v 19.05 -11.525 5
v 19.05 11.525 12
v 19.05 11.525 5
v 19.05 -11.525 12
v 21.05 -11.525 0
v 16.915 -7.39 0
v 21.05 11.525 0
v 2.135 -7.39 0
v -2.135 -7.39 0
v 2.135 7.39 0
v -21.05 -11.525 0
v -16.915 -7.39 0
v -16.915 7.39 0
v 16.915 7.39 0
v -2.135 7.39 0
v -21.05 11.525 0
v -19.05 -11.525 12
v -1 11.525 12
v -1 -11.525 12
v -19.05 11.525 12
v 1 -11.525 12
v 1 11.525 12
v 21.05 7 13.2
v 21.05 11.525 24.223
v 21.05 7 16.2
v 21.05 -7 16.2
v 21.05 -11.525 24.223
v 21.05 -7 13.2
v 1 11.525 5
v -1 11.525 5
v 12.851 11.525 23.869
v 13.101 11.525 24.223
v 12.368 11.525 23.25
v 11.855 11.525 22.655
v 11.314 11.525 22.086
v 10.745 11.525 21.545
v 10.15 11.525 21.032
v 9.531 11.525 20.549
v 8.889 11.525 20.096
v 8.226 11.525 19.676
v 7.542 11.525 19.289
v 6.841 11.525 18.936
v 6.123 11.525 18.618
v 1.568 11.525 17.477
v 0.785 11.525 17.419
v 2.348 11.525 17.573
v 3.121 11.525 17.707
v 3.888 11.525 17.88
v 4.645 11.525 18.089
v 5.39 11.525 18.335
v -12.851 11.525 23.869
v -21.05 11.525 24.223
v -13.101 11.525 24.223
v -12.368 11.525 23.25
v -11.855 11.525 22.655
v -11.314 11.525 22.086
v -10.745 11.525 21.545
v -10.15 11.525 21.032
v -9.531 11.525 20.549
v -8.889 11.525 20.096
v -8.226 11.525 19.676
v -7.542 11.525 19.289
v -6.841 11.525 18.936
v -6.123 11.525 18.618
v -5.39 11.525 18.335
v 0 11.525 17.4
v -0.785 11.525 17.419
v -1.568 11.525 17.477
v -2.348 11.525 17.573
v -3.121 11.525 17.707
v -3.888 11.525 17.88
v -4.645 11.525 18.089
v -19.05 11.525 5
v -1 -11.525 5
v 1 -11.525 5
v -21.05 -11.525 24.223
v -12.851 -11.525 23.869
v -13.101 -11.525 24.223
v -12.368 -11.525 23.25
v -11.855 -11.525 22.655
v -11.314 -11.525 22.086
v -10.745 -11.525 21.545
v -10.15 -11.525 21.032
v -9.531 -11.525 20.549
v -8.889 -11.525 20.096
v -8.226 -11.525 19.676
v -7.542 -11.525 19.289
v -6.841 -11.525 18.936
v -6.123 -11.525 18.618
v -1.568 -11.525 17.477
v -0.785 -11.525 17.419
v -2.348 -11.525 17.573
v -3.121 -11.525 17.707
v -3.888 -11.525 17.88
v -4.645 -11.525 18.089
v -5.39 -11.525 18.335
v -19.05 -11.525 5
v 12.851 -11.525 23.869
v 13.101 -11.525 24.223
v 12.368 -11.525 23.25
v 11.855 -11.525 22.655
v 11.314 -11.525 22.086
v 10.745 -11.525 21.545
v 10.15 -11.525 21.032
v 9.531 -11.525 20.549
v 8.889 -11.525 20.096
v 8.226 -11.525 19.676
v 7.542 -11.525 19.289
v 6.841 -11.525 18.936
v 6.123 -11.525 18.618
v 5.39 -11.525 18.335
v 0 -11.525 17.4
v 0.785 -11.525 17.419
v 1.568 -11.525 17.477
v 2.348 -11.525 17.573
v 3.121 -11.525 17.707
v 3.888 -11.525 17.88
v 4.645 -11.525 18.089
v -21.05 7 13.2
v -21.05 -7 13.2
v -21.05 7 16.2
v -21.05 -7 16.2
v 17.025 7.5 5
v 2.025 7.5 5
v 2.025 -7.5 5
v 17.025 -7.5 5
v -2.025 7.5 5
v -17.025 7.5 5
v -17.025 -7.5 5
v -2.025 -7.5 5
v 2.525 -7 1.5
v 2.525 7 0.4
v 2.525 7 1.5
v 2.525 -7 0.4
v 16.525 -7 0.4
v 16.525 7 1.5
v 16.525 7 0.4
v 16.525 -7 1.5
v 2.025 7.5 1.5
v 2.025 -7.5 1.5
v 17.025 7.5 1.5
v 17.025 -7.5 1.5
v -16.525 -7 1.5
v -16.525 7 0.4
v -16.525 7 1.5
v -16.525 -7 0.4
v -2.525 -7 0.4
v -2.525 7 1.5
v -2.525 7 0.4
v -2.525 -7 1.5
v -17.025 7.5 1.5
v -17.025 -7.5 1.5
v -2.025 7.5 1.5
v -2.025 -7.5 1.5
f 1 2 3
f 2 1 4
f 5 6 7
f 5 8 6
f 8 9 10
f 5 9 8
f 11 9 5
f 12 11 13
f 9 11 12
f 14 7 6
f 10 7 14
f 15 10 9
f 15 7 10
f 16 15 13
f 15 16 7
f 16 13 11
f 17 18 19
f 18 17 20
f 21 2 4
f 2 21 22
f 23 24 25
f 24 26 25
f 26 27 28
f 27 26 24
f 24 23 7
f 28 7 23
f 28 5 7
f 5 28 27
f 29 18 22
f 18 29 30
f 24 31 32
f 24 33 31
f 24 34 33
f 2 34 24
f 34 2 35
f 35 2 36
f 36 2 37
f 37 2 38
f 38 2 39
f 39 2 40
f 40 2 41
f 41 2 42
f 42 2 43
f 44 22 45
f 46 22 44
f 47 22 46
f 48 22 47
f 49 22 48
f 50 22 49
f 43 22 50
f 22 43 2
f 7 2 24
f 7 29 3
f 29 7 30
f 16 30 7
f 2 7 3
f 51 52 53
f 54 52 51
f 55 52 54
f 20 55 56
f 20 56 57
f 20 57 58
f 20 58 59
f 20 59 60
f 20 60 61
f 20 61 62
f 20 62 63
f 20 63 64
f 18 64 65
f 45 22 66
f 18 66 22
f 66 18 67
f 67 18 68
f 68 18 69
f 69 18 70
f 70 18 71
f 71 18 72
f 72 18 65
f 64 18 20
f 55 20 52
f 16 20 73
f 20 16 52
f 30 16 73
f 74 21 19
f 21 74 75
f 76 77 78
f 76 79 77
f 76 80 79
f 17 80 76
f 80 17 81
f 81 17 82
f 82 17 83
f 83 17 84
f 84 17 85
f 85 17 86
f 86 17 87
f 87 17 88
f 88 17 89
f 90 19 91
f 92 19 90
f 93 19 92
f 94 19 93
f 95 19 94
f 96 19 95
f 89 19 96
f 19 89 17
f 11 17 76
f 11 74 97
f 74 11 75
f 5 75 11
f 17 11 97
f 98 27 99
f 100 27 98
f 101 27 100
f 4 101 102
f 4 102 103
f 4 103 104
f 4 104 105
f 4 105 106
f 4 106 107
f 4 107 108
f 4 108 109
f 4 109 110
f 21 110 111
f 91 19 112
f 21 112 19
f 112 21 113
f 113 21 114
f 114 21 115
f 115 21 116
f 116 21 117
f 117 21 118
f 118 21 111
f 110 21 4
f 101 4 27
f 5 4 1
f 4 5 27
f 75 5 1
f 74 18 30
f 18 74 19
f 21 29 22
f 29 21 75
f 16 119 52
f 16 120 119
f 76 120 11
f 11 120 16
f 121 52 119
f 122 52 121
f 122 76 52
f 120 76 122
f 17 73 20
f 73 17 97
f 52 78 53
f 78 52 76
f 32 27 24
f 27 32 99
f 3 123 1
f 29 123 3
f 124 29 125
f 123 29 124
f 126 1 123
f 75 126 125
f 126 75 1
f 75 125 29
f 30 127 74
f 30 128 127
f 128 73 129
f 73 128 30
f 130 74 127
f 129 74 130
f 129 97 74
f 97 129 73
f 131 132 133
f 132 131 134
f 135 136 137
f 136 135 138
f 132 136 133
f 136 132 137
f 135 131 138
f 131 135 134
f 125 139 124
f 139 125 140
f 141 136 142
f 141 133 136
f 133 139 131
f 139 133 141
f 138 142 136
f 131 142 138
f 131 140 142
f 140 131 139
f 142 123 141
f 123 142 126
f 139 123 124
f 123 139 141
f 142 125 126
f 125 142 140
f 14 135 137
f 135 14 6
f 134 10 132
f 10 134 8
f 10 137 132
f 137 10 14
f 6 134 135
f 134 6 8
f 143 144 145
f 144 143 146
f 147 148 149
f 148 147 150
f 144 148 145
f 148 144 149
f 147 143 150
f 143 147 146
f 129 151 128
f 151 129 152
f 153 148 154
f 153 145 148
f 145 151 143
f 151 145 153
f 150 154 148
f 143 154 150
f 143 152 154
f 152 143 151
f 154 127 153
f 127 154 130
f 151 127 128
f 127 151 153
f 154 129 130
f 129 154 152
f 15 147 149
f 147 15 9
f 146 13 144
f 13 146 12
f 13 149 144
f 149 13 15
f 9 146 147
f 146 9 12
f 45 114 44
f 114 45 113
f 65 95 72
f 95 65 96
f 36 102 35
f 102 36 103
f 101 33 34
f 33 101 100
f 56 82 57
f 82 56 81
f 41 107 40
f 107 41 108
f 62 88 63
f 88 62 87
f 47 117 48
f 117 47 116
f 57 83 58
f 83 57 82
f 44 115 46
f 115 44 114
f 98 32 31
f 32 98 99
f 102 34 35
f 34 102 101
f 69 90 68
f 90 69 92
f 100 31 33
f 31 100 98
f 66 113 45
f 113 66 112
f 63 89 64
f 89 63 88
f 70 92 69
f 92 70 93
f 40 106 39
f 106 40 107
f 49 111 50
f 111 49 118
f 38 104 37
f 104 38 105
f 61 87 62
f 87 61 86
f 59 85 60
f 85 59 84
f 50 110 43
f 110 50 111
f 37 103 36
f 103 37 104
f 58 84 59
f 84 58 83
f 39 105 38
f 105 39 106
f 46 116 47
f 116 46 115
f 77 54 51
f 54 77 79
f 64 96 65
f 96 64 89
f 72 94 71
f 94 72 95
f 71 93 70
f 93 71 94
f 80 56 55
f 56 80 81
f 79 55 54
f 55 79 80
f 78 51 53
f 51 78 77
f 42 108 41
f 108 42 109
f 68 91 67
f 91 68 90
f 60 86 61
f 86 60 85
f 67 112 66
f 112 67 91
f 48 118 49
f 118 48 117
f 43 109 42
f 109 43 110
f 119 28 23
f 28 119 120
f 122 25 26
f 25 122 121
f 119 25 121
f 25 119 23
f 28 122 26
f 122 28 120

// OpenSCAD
// file: params.scad
// Every part includes this file, so a fit measured on a test print changes in
// one place. All lengths in mm.

// Snap clip around an aerobar extension. The bore and the 30 mm block across
// the tube are the Onshape V8 crossbar's, which clips onto the Profile Design
// Airstryke extensions.
tube_bore = 22.3;
clip_width = 30;
// Solid between the top of the bore and the clip's closed face.
clip_floor = 6;
// The tightest of the fit test's 20.6, 21.0 and 21.4, and the best grip in PLA
// on a 10 mm slice. A full-length clip grips harder.
clip_mouth = 20.6;
// Over the tape where the bar pod sits: a paper strip's wrap length / pi.
bar_diameter = 32;

key_pitch = 19.05;

// Every fit-test cutout from 13.9 to 14.1 held a switch, so the middle one
// leaves margin either way.
switch_cutout = 14.0;
// MX switch clips latch under a lip this thick, and need a wider pocket below
// it to spring back out into.
switch_plate = 1.5;
switch_relief = 15.0;

m3_clearance = 3.4;
// Nominal M3 nuts are 2.4 thick and 5.5 across the flats.
m3_nut_depth = 2.6;
// main file
// Two keys stacked across the base bar, facing forward. A strap holds a saddle
// cut to the taped bar against its front.
include <params.scad>

// From the plate top: 5 of switch housing and 3.3 of pins, then room to solder
// a wire on and bend it out through either open end of the bay.
switch_depth = 12;
plate_thickness = 5;
wall = 2;
// The cap face prints on the bed, and the chamfer keeps first-layer squish out
// of the cutout.
chamfer = 0.4;
// Width along the bar and thickness: a 1/2" velcro strap, or two zip ties up
// to 4.8 mm wide side by side.
strap = [14, 3];
skin = 1.2;
// Degrees either side of the bar's front that the saddle wraps.
wrap = 55;

r = bar_diameter / 2;
width = 2 * key_pitch + 2 * wall;
depth = key_pitch + 2 * wall;
back = r * cos(wrap);
floor_top = r + skin + strap[1] + skin;
plate_top = floor_top + switch_depth;

$fn = 128;

module switch_hole() {
    base = plate_top - plate_thickness;
    translate([-switch_cutout / 2, -switch_cutout / 2, base - 1])
        cube([switch_cutout, switch_cutout, plate_thickness + 2]);
    translate([-switch_relief / 2, -switch_relief / 2, base - 1])
        cube([switch_relief, switch_relief, plate_thickness - switch_plate + 1]);
    translate([0, 0, plate_top - chamfer])
        linear_extrude(chamfer + 0.01, scale = (switch_cutout + 2 * chamfer) / switch_cutout)
            square(switch_cutout, center = true);
}

// Modeled as mounted: the bar's center on the origin, running along y, keys
// facing forward along +z.
module pod() {
    difference() {
        union() {
            translate([-width / 2, -depth / 2, back])
                cube([width, depth, floor_top - back]);
            // Two outer walls and a rib between the switches.
            for (x = [-width / 2, -wall / 2, width / 2 - wall])
                translate([x, -depth / 2, floor_top]) cube([wall, depth, switch_depth]);
            translate([-width / 2, -depth / 2, plate_top - plate_thickness])
                cube([width, depth, plate_thickness]);
        }
        rotate([90, 0, 0]) cylinder(r = r, h = depth + 2, center = true);
        translate([-width / 2 - 1, -strap[0] / 2, r + skin])
            cube([width + 2, strap[0], strap[1]]);
        for (x = [-key_pitch / 2, key_pitch / 2])
            translate([x, 0, 0]) switch_hole();
    }
}

// Upside down to print: cap face on the bed, saddle up.
translate([0, 0, plate_top]) rotate([0, 180, 0]) pod();
